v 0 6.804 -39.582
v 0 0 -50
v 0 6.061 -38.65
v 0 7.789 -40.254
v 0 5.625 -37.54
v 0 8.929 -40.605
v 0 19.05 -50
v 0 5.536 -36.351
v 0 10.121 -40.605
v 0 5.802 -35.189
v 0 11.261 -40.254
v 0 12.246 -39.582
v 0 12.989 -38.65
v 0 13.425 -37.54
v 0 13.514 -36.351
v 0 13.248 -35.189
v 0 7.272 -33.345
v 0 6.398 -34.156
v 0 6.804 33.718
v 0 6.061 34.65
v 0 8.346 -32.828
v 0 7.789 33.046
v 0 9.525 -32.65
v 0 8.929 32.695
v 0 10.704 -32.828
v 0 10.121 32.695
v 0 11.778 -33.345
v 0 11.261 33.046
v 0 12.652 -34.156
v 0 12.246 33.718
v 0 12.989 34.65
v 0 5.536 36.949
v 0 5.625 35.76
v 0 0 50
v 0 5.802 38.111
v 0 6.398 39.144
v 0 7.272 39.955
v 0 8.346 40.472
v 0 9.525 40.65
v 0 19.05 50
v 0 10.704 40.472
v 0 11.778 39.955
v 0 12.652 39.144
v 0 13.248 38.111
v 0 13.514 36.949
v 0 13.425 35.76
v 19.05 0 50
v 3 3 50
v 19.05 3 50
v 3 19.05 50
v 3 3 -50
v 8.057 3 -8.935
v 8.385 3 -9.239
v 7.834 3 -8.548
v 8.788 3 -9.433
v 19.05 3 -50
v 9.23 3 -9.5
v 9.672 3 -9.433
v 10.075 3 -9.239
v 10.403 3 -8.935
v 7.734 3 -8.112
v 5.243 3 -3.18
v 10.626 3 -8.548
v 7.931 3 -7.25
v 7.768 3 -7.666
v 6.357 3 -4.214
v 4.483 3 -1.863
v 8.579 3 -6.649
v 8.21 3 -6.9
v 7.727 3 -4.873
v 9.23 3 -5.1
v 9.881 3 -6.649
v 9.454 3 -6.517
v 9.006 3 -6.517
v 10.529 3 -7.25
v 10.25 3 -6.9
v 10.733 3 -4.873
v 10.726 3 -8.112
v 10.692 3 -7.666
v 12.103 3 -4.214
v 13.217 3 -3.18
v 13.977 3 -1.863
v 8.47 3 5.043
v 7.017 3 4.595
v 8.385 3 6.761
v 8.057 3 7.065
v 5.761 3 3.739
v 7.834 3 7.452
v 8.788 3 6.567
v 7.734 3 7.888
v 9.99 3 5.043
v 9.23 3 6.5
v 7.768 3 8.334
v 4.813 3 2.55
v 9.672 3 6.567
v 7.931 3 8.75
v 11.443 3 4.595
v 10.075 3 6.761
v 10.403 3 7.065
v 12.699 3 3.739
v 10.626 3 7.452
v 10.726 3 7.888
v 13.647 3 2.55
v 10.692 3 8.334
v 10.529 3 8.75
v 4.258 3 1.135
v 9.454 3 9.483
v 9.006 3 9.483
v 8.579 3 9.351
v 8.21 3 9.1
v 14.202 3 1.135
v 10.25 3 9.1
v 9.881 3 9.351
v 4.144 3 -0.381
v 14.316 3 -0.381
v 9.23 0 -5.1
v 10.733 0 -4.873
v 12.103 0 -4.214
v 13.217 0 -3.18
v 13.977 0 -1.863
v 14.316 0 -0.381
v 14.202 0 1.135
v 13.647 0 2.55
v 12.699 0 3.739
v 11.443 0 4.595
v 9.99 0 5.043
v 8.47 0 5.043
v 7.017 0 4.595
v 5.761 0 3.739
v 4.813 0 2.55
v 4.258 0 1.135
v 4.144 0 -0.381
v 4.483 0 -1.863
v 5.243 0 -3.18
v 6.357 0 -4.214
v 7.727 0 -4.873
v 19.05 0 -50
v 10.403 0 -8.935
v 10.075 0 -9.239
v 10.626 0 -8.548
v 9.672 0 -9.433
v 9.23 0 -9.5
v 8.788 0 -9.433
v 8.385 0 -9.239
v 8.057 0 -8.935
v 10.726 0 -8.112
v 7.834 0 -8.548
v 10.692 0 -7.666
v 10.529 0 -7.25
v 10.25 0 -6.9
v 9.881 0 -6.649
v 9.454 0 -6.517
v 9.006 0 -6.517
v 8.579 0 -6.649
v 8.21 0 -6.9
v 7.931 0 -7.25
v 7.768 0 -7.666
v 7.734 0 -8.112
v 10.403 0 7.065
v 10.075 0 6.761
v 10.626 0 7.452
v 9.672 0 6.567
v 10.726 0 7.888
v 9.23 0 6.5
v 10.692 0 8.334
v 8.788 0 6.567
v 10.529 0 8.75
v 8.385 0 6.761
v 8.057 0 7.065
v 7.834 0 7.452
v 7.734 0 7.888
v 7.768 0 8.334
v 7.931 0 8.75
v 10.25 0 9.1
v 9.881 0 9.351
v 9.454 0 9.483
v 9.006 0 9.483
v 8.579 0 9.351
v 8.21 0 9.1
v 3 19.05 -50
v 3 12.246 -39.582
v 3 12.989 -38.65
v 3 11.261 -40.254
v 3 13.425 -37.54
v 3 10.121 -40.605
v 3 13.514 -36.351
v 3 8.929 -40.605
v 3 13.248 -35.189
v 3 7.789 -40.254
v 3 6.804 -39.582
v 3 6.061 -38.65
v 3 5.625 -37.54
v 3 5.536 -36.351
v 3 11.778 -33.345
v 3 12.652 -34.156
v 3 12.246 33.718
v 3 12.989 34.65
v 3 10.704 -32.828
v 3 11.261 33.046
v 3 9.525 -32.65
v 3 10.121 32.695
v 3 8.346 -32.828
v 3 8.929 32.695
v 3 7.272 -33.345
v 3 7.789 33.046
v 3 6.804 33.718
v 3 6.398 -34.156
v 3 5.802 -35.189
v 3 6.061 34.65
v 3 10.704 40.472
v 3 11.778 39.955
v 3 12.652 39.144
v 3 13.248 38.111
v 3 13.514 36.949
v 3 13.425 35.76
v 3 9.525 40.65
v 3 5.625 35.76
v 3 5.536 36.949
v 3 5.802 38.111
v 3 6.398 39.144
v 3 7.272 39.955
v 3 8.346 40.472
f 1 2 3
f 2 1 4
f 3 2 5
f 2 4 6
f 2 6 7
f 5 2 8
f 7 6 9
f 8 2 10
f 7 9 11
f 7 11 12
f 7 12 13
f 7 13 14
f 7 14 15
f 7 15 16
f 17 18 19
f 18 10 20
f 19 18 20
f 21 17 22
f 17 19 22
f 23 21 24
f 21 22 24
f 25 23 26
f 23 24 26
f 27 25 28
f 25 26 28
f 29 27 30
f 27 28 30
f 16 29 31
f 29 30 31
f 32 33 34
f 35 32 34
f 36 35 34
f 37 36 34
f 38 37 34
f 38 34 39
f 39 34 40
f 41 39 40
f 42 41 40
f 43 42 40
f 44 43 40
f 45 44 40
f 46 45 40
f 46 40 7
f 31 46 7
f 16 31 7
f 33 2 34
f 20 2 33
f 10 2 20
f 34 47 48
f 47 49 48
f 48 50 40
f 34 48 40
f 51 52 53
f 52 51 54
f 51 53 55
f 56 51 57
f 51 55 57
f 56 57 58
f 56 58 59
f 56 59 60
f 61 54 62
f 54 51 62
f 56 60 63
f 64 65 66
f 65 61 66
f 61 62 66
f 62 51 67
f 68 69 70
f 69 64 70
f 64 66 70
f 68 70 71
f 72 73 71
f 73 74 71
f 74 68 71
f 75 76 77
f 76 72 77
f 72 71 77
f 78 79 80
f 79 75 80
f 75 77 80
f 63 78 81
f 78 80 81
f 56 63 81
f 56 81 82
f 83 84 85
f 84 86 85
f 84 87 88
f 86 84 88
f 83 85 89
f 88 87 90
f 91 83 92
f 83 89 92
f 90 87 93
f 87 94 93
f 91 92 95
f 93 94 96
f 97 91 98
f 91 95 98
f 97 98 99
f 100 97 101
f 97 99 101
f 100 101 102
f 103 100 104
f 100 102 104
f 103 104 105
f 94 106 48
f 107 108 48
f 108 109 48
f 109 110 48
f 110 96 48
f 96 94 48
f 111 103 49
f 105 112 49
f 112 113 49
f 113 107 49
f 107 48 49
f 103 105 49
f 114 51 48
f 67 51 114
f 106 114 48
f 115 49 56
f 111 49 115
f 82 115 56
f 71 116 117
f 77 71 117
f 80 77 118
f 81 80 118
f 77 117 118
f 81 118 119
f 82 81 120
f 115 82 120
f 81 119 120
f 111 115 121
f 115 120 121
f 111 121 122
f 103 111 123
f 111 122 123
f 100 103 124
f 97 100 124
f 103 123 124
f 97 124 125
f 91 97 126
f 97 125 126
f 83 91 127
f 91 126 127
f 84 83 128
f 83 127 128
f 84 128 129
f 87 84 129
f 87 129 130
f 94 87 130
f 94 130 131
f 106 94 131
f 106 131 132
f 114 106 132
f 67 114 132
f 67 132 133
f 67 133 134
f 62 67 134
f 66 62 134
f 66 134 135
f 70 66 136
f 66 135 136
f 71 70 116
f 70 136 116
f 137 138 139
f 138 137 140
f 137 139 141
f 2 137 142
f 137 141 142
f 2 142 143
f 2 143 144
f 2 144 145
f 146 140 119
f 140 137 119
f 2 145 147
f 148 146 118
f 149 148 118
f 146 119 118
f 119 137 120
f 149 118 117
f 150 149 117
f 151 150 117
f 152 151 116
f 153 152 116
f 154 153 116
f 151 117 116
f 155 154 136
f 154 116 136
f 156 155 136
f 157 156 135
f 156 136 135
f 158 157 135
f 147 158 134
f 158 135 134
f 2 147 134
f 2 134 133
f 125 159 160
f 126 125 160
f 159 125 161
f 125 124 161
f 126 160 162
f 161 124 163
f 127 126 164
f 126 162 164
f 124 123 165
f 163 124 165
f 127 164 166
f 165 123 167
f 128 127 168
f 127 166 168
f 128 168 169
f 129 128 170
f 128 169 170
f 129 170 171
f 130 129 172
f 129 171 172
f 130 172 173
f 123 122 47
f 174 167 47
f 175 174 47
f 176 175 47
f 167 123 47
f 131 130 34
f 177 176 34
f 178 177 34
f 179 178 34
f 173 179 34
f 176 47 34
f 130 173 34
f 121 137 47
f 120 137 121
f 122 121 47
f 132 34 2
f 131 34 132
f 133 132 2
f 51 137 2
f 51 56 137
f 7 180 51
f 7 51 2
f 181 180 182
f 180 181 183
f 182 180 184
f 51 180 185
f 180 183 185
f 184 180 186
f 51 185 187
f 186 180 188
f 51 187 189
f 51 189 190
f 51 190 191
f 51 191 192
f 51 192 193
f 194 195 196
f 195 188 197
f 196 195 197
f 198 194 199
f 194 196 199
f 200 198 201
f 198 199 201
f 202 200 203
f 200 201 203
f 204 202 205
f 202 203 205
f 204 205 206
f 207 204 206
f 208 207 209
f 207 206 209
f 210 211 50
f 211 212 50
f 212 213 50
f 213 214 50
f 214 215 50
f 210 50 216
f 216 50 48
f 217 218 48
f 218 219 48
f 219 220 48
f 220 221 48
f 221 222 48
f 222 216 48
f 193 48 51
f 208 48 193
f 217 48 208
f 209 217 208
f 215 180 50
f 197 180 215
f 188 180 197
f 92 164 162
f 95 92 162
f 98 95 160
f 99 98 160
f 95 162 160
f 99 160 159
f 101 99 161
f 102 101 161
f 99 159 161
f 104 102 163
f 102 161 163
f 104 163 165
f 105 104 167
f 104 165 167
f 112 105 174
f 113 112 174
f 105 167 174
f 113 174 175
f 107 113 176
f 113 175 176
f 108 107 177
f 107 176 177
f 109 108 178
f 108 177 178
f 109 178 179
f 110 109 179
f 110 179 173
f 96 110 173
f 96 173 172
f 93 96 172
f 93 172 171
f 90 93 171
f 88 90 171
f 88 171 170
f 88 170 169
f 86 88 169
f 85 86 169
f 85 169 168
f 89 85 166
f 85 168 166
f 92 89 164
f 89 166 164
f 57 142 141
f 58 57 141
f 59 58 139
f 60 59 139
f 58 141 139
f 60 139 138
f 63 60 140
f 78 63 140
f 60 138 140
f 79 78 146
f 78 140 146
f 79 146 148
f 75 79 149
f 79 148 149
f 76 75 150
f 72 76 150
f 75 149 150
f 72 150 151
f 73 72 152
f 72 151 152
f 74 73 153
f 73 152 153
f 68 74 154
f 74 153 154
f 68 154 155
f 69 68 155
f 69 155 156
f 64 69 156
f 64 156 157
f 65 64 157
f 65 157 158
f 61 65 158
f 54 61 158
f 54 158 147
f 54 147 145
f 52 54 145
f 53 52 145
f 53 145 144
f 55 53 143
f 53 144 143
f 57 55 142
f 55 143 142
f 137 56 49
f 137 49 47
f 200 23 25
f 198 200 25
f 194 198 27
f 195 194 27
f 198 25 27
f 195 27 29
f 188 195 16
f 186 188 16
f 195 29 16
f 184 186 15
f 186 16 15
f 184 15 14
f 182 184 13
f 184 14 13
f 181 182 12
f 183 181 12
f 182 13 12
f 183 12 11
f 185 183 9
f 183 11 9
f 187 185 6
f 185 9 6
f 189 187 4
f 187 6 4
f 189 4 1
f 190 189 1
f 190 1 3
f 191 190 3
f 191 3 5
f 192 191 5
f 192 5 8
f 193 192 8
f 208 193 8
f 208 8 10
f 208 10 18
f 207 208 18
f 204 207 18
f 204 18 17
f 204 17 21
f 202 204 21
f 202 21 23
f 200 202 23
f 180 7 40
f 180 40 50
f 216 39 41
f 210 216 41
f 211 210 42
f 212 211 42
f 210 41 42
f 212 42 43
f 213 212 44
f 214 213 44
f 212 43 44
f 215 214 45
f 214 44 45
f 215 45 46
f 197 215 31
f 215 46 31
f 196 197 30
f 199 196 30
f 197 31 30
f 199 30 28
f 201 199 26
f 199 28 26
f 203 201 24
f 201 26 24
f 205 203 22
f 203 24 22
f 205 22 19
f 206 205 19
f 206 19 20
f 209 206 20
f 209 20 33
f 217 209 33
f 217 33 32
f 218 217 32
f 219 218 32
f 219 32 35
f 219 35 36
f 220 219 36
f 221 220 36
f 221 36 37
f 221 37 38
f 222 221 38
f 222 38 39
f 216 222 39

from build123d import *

# Parameters (mm, degrees)
EXTRUDE_THIN1_DEPTH = 50
CUT_EXTRUDE2_REACH  = 58.796
SKETCH4_R           = 4
SKETCH3_R           = 5.1
SKETCH3_R_2         = 1.5
CUT_EXTRUDE1_DEPTH  = 3


with BuildPart() as part:
    # Sketch1 → Extrude-Thin1 (new, symmetric)
    with BuildSketch(Plane.XY):
        Polygon((19.05, 0), (0, 0), (0, 19.05), (3, 19.05), (3, 3), (19.05, 3), align=None)
    extrude(amount=EXTRUDE_THIN1_DEPTH, both=True)

    # Sketch4 → Cut-Extrude2 (cut, up to next)
    with BuildSketch(Plane.ZY, mode=Mode.PRIVATE) as cut_extrude2_sk1:
        with Locations((-36.65, 9.525)):
            Circle(SKETCH4_R)
    cut_extrude2_tool1 = extrude(cut_extrude2_sk1.sketch, amount=-CUT_EXTRUDE2_REACH, mode=Mode.PRIVATE) & part.part
    # Sketch4 → Cut-Extrude2 (cut, up to next)
    with BuildSketch(Plane.ZY, mode=Mode.PRIVATE) as cut_extrude2_sk2:
        with Locations((36.65, 9.525)):
            Circle(SKETCH4_R)
    cut_extrude2_tool2 = extrude(cut_extrude2_sk2.sketch, amount=-CUT_EXTRUDE2_REACH, mode=Mode.PRIVATE) & part.part
    add(cut_extrude2_tool1.solids().sort_by_distance((0, 9.525, -36.65))[0], mode=Mode.SUBTRACT)
    add(cut_extrude2_tool2.solids().sort_by_distance((0, 9.525, 36.65))[0], mode=Mode.SUBTRACT)

    # Sketch3 → Cut-Extrude1 (cut)
    with BuildSketch(Plane.XZ):
        with Locations(Location((9.23, 0, 0), (0, 0, 270))):
            Circle(SKETCH3_R)
        with Locations(Location((9.23, -8, 0), (0, 0, 270))):
            Circle(SKETCH3_R_2)
        with Locations(Location((9.23, 8, 0), (0, 0, 270))):
            Circle(SKETCH3_R_2)
    extrude(amount=-CUT_EXTRUDE1_DEPTH, mode=Mode.SUBTRACT)


solid = part.part
